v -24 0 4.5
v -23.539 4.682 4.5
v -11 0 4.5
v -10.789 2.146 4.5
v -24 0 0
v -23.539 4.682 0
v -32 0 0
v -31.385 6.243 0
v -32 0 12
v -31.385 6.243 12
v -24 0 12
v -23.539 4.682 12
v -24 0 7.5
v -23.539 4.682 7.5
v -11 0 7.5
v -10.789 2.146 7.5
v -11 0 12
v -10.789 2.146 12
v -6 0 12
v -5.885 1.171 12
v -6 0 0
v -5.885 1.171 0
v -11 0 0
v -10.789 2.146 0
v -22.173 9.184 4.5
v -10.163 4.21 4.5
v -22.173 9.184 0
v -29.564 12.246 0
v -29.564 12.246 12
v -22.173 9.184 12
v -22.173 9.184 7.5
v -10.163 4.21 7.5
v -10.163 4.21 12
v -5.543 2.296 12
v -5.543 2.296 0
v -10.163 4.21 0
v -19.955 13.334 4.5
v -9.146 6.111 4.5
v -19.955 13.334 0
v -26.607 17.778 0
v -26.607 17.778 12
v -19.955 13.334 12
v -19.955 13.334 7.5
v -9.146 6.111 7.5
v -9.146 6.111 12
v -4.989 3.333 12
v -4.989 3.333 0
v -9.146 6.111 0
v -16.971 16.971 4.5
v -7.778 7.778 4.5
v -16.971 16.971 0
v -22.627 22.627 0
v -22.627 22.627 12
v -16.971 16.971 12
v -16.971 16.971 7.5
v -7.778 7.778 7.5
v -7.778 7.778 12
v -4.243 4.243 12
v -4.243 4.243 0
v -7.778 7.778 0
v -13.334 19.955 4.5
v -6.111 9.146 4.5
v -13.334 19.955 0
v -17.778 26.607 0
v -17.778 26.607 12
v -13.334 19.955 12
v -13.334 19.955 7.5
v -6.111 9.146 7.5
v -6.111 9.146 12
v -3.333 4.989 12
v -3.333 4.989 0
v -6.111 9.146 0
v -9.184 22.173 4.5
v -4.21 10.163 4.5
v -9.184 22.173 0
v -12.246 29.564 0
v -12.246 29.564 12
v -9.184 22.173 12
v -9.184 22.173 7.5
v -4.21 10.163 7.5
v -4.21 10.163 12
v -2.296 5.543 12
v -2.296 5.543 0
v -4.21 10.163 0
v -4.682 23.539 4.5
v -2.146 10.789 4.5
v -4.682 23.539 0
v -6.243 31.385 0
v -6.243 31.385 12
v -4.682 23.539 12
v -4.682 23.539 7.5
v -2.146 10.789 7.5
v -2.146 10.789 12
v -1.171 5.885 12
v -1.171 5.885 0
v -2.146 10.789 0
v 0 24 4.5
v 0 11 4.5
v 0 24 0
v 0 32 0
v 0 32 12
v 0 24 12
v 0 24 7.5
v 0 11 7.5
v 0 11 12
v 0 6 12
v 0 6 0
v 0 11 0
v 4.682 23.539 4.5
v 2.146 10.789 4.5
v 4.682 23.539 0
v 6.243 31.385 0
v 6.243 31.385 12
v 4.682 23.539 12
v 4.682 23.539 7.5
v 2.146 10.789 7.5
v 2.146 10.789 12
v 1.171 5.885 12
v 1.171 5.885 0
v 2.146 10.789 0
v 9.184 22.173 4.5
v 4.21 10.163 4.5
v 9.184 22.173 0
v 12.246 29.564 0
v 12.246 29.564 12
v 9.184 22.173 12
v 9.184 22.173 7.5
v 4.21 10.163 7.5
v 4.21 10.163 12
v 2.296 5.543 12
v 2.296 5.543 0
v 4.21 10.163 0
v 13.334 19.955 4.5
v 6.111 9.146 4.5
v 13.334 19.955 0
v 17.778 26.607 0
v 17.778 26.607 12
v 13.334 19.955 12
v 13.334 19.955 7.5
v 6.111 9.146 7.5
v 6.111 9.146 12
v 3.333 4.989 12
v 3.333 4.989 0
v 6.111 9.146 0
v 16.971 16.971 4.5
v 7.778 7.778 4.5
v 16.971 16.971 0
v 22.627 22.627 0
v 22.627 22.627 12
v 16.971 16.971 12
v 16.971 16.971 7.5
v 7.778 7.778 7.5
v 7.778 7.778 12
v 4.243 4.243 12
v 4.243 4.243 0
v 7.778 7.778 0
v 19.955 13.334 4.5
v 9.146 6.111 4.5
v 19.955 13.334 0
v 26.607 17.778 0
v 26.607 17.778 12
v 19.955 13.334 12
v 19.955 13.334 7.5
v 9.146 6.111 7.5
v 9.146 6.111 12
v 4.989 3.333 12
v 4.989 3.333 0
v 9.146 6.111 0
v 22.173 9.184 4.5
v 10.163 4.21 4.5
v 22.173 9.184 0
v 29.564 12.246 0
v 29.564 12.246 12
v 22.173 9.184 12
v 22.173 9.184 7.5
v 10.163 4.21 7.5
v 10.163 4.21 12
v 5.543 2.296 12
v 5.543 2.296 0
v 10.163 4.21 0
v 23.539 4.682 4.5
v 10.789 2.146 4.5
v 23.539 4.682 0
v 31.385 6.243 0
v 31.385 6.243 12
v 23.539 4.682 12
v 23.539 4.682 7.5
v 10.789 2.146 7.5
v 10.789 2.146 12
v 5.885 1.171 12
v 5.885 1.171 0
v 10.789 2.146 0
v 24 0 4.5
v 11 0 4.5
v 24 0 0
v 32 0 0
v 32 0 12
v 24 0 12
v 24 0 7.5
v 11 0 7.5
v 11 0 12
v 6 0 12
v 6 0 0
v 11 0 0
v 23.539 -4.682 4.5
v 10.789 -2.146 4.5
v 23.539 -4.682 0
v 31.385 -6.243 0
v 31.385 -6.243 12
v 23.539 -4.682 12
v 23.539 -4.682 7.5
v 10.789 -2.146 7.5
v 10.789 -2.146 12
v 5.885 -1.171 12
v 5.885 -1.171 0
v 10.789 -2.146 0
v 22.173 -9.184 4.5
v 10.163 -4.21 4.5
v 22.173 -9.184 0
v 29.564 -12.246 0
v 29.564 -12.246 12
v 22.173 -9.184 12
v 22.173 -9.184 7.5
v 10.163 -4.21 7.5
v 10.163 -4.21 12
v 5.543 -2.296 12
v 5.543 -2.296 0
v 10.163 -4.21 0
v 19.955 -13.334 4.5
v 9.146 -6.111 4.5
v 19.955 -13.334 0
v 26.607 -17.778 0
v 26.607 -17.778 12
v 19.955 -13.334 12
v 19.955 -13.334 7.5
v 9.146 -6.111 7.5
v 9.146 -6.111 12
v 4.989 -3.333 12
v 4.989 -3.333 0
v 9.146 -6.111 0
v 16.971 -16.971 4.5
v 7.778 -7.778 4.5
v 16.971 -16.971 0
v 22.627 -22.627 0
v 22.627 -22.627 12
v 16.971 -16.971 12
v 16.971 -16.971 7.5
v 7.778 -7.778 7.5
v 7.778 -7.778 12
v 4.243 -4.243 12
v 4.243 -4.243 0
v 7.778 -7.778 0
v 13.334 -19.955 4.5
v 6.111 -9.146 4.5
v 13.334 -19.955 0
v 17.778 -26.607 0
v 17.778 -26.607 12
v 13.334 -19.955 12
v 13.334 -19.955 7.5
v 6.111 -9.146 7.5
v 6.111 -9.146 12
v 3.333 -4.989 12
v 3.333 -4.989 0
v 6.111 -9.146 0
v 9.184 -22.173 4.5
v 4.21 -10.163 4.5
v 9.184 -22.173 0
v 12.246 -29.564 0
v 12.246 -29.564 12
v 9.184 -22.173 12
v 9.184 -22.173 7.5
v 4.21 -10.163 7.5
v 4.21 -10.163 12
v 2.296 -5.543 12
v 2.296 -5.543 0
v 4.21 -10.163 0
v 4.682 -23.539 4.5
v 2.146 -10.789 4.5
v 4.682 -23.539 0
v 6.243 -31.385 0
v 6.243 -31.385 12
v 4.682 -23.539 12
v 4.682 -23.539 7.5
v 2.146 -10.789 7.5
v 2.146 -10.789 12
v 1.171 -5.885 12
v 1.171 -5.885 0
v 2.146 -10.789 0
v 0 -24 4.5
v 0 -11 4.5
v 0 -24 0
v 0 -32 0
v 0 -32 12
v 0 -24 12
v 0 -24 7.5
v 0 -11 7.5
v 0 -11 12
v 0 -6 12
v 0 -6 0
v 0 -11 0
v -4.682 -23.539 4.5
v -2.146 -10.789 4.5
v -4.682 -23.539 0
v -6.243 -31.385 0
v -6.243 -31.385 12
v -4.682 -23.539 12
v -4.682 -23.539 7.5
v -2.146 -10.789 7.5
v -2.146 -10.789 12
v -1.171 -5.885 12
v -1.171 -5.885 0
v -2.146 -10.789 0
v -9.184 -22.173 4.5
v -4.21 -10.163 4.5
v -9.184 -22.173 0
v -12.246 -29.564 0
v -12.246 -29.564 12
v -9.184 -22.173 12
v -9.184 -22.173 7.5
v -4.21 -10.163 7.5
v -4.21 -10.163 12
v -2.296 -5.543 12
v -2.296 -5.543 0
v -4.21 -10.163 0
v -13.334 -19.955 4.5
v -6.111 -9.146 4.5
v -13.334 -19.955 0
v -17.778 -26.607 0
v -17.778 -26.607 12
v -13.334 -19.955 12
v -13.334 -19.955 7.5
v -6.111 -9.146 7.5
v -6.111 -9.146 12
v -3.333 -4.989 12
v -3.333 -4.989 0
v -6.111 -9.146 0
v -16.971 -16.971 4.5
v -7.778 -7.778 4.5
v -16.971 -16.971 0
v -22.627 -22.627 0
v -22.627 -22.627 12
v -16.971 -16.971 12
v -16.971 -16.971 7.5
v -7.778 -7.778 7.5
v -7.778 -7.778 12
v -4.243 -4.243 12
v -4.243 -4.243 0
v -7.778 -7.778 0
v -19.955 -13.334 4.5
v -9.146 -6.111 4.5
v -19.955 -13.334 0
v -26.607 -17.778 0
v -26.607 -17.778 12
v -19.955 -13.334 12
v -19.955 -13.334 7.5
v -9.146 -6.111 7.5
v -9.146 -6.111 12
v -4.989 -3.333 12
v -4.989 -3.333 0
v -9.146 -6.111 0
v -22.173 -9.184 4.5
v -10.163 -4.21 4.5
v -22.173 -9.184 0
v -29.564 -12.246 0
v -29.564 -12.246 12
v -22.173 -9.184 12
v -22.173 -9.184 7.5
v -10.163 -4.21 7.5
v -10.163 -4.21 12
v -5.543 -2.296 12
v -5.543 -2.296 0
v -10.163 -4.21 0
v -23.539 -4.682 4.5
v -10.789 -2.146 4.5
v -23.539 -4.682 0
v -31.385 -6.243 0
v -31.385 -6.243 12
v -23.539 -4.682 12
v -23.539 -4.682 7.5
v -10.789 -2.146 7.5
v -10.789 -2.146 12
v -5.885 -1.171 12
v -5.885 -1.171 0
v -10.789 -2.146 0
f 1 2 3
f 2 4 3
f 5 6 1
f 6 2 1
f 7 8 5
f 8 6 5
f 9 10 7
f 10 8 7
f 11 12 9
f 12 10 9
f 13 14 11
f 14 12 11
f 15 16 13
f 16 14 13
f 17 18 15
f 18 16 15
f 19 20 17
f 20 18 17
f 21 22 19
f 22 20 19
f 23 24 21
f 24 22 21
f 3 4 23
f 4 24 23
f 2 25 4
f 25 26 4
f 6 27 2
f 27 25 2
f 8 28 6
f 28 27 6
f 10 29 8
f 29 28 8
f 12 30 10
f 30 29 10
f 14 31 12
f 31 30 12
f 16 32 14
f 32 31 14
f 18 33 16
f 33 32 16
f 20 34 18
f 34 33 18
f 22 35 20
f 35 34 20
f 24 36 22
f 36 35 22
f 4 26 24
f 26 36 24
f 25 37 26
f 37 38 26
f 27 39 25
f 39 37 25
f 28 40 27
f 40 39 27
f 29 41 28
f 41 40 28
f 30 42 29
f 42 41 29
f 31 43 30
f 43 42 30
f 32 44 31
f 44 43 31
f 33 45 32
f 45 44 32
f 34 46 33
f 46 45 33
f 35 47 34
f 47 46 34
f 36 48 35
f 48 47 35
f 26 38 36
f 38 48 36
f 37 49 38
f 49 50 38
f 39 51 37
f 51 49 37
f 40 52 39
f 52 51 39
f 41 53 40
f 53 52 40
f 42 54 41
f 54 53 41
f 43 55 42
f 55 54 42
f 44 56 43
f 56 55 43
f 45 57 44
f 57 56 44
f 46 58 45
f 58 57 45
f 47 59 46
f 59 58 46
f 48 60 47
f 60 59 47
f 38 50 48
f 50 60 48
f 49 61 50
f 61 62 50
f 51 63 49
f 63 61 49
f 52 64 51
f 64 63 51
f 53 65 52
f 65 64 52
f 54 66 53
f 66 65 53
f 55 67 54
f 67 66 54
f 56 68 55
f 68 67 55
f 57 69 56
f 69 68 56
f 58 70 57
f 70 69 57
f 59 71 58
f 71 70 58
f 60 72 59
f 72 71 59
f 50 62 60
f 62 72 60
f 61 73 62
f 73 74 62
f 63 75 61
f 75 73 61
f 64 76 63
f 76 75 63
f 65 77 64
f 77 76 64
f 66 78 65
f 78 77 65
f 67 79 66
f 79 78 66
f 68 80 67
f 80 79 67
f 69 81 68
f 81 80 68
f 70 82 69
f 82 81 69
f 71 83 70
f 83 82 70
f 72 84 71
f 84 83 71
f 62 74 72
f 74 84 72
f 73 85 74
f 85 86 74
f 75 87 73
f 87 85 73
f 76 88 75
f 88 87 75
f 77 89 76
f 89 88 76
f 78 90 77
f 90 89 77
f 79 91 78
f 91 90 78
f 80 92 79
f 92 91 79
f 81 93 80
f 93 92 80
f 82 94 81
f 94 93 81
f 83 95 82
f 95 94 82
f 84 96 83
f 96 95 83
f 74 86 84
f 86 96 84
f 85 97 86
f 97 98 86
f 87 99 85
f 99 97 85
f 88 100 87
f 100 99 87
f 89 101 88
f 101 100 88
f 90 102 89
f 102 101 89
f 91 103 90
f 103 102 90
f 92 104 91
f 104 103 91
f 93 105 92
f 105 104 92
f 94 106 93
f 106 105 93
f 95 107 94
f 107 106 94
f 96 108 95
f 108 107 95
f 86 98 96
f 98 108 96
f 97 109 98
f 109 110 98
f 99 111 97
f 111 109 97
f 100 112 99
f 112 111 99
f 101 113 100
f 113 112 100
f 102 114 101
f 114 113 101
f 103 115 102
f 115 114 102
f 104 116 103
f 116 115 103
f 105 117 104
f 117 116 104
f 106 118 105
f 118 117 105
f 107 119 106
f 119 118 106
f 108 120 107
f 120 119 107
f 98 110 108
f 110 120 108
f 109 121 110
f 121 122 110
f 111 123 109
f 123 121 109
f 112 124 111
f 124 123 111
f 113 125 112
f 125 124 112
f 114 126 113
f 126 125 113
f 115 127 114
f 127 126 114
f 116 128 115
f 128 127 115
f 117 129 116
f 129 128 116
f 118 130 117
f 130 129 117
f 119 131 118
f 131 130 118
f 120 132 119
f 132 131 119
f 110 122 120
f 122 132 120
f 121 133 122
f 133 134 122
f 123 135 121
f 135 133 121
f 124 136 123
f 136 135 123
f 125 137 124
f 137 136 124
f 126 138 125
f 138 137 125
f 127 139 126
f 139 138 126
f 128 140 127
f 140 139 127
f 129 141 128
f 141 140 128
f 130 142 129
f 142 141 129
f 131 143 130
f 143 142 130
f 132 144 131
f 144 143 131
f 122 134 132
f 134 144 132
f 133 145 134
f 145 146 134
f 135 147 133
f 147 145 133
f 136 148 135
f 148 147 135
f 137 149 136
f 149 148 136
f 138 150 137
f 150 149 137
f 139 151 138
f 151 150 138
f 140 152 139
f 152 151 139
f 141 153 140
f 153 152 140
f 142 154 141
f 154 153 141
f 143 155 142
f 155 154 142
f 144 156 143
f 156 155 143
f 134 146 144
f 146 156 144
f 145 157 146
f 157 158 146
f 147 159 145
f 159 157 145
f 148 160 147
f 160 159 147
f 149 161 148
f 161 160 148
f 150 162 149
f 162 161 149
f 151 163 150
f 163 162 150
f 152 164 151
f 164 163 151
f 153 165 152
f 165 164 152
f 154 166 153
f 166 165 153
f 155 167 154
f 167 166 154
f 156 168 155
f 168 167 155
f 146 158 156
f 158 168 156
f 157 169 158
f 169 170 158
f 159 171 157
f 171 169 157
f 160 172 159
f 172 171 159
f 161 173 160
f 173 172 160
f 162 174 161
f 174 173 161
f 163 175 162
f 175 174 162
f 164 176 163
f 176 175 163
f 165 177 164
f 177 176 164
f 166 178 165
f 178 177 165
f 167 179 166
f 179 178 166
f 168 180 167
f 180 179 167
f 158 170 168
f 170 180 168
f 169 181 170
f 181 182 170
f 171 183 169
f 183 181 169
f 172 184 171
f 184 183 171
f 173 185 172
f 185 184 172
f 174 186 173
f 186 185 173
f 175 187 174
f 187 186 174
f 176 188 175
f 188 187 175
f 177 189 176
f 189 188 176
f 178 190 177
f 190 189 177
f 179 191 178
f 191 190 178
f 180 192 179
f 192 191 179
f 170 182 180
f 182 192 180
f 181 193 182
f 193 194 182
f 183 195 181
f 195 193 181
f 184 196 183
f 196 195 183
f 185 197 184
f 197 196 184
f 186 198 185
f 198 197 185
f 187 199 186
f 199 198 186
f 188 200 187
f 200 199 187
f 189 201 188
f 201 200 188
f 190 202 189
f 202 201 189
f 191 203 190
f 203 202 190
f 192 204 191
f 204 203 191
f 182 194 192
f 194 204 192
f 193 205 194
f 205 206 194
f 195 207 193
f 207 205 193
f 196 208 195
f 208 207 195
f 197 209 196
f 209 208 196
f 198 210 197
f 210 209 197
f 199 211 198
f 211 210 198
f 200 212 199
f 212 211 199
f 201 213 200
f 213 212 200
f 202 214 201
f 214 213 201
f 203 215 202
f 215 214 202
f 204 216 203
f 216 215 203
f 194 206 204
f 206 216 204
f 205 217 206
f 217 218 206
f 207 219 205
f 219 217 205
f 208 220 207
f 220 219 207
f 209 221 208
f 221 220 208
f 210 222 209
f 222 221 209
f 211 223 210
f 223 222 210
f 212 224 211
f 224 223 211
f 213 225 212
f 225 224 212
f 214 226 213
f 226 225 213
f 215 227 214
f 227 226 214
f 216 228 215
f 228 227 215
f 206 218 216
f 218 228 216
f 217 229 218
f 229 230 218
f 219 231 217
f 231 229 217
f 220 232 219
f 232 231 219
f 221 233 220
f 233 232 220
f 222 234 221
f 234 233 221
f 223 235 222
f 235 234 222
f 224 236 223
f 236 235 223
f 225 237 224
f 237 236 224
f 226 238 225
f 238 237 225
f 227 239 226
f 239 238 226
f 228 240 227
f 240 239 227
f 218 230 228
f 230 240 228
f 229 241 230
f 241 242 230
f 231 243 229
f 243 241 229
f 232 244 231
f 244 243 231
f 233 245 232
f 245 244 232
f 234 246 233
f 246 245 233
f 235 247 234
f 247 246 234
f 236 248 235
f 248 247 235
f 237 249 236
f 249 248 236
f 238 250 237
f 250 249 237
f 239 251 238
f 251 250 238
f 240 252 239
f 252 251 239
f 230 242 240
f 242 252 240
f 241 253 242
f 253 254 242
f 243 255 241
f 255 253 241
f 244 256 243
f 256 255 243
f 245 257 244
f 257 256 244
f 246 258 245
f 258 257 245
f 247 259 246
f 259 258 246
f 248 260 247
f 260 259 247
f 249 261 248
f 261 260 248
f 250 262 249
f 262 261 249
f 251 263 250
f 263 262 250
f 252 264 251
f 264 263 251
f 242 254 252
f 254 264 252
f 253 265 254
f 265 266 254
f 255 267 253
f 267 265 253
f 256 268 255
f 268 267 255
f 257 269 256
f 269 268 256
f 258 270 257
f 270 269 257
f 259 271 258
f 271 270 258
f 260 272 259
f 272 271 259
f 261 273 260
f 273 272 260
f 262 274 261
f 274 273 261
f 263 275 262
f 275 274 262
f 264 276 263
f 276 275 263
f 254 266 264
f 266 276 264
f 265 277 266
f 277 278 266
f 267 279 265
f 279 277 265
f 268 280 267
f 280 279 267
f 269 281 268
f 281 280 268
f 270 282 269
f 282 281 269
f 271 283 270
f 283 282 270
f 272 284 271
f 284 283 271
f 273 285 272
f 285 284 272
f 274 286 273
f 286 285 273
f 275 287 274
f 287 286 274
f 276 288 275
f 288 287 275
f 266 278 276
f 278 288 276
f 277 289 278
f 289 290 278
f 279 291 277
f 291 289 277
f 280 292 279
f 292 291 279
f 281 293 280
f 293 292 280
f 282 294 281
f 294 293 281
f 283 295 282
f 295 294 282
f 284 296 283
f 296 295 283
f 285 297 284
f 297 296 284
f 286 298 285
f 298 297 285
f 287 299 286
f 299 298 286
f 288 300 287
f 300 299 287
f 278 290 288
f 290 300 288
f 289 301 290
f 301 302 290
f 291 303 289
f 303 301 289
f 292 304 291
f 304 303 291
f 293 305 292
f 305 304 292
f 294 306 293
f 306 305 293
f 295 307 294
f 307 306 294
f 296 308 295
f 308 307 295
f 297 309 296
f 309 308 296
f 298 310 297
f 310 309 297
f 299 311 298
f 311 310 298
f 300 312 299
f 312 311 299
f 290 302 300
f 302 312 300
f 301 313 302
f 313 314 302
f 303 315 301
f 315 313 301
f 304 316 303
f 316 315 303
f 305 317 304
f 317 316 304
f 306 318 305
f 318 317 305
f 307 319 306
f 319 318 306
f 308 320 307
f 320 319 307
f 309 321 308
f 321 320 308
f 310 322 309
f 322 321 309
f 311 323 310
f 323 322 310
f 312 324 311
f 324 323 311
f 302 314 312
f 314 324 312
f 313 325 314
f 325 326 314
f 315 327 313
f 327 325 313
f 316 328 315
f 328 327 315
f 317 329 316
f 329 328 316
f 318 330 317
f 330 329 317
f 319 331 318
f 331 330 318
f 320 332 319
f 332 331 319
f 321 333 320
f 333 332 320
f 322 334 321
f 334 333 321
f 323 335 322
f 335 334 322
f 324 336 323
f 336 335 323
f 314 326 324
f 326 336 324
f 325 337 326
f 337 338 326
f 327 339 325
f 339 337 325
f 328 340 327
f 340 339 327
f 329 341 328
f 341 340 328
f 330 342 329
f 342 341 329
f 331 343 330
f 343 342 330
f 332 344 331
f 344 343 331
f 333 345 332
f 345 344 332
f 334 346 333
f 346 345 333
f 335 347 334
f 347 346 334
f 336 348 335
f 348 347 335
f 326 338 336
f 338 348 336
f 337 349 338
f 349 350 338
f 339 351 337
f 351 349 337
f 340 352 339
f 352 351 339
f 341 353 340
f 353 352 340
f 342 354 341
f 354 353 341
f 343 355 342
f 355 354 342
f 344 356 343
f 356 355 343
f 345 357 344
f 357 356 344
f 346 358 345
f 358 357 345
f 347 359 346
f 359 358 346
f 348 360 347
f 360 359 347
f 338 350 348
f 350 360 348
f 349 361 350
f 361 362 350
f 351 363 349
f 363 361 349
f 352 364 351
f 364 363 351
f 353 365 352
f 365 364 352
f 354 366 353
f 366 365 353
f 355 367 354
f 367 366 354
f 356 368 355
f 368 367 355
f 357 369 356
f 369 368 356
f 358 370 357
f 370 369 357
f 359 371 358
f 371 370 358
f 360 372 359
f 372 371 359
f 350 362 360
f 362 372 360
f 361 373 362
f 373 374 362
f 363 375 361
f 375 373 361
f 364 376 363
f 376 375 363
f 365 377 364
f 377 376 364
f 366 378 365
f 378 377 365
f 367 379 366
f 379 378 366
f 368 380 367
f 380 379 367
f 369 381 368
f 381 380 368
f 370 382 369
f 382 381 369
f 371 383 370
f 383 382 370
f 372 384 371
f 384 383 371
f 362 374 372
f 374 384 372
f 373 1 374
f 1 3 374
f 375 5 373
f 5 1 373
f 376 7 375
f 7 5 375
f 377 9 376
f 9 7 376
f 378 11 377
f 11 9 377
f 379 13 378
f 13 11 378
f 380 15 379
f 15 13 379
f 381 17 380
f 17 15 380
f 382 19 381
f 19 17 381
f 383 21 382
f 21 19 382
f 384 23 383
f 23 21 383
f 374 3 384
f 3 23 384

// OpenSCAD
$fn = 32;

// ----------------------------------------------------------------------
// Revolved part: handwheel R32
// ----------------------------------------------------------------------

// --- parameters (mm) ---
bore_r = 6;               // bore radius
rim_r = 32;               // rim radius
rim_w = 8;                // rim axial width
rim_t = 12;               // rim diameter height
hub_r = 11;               // hub radius
web_t = 3;                // web thickness
revolve_angle = 360;      // revolve sweep, degrees
fit_tol = 0.02;           // declared fit tolerance (prompt contract)
free_tol = 0.2;           // declared free tolerance (prompt contract)

bore_d = 2 * bore_r;
rim_d = 2 * rim_r;
hub_d = 2 * hub_r;

profile = [[6, 0], [11, 0], [11, 4.5], [24, 4.5], [24, 0], [32, 0], [32, 12], [24, 12], [24, 7.5], [11, 7.5], [11, 12], [6, 12]];  // primary outline, 12 points, counter clockwise

// --- the one profile operation ---
rotate_extrude(angle = revolve_angle) polygon(points = profile);
